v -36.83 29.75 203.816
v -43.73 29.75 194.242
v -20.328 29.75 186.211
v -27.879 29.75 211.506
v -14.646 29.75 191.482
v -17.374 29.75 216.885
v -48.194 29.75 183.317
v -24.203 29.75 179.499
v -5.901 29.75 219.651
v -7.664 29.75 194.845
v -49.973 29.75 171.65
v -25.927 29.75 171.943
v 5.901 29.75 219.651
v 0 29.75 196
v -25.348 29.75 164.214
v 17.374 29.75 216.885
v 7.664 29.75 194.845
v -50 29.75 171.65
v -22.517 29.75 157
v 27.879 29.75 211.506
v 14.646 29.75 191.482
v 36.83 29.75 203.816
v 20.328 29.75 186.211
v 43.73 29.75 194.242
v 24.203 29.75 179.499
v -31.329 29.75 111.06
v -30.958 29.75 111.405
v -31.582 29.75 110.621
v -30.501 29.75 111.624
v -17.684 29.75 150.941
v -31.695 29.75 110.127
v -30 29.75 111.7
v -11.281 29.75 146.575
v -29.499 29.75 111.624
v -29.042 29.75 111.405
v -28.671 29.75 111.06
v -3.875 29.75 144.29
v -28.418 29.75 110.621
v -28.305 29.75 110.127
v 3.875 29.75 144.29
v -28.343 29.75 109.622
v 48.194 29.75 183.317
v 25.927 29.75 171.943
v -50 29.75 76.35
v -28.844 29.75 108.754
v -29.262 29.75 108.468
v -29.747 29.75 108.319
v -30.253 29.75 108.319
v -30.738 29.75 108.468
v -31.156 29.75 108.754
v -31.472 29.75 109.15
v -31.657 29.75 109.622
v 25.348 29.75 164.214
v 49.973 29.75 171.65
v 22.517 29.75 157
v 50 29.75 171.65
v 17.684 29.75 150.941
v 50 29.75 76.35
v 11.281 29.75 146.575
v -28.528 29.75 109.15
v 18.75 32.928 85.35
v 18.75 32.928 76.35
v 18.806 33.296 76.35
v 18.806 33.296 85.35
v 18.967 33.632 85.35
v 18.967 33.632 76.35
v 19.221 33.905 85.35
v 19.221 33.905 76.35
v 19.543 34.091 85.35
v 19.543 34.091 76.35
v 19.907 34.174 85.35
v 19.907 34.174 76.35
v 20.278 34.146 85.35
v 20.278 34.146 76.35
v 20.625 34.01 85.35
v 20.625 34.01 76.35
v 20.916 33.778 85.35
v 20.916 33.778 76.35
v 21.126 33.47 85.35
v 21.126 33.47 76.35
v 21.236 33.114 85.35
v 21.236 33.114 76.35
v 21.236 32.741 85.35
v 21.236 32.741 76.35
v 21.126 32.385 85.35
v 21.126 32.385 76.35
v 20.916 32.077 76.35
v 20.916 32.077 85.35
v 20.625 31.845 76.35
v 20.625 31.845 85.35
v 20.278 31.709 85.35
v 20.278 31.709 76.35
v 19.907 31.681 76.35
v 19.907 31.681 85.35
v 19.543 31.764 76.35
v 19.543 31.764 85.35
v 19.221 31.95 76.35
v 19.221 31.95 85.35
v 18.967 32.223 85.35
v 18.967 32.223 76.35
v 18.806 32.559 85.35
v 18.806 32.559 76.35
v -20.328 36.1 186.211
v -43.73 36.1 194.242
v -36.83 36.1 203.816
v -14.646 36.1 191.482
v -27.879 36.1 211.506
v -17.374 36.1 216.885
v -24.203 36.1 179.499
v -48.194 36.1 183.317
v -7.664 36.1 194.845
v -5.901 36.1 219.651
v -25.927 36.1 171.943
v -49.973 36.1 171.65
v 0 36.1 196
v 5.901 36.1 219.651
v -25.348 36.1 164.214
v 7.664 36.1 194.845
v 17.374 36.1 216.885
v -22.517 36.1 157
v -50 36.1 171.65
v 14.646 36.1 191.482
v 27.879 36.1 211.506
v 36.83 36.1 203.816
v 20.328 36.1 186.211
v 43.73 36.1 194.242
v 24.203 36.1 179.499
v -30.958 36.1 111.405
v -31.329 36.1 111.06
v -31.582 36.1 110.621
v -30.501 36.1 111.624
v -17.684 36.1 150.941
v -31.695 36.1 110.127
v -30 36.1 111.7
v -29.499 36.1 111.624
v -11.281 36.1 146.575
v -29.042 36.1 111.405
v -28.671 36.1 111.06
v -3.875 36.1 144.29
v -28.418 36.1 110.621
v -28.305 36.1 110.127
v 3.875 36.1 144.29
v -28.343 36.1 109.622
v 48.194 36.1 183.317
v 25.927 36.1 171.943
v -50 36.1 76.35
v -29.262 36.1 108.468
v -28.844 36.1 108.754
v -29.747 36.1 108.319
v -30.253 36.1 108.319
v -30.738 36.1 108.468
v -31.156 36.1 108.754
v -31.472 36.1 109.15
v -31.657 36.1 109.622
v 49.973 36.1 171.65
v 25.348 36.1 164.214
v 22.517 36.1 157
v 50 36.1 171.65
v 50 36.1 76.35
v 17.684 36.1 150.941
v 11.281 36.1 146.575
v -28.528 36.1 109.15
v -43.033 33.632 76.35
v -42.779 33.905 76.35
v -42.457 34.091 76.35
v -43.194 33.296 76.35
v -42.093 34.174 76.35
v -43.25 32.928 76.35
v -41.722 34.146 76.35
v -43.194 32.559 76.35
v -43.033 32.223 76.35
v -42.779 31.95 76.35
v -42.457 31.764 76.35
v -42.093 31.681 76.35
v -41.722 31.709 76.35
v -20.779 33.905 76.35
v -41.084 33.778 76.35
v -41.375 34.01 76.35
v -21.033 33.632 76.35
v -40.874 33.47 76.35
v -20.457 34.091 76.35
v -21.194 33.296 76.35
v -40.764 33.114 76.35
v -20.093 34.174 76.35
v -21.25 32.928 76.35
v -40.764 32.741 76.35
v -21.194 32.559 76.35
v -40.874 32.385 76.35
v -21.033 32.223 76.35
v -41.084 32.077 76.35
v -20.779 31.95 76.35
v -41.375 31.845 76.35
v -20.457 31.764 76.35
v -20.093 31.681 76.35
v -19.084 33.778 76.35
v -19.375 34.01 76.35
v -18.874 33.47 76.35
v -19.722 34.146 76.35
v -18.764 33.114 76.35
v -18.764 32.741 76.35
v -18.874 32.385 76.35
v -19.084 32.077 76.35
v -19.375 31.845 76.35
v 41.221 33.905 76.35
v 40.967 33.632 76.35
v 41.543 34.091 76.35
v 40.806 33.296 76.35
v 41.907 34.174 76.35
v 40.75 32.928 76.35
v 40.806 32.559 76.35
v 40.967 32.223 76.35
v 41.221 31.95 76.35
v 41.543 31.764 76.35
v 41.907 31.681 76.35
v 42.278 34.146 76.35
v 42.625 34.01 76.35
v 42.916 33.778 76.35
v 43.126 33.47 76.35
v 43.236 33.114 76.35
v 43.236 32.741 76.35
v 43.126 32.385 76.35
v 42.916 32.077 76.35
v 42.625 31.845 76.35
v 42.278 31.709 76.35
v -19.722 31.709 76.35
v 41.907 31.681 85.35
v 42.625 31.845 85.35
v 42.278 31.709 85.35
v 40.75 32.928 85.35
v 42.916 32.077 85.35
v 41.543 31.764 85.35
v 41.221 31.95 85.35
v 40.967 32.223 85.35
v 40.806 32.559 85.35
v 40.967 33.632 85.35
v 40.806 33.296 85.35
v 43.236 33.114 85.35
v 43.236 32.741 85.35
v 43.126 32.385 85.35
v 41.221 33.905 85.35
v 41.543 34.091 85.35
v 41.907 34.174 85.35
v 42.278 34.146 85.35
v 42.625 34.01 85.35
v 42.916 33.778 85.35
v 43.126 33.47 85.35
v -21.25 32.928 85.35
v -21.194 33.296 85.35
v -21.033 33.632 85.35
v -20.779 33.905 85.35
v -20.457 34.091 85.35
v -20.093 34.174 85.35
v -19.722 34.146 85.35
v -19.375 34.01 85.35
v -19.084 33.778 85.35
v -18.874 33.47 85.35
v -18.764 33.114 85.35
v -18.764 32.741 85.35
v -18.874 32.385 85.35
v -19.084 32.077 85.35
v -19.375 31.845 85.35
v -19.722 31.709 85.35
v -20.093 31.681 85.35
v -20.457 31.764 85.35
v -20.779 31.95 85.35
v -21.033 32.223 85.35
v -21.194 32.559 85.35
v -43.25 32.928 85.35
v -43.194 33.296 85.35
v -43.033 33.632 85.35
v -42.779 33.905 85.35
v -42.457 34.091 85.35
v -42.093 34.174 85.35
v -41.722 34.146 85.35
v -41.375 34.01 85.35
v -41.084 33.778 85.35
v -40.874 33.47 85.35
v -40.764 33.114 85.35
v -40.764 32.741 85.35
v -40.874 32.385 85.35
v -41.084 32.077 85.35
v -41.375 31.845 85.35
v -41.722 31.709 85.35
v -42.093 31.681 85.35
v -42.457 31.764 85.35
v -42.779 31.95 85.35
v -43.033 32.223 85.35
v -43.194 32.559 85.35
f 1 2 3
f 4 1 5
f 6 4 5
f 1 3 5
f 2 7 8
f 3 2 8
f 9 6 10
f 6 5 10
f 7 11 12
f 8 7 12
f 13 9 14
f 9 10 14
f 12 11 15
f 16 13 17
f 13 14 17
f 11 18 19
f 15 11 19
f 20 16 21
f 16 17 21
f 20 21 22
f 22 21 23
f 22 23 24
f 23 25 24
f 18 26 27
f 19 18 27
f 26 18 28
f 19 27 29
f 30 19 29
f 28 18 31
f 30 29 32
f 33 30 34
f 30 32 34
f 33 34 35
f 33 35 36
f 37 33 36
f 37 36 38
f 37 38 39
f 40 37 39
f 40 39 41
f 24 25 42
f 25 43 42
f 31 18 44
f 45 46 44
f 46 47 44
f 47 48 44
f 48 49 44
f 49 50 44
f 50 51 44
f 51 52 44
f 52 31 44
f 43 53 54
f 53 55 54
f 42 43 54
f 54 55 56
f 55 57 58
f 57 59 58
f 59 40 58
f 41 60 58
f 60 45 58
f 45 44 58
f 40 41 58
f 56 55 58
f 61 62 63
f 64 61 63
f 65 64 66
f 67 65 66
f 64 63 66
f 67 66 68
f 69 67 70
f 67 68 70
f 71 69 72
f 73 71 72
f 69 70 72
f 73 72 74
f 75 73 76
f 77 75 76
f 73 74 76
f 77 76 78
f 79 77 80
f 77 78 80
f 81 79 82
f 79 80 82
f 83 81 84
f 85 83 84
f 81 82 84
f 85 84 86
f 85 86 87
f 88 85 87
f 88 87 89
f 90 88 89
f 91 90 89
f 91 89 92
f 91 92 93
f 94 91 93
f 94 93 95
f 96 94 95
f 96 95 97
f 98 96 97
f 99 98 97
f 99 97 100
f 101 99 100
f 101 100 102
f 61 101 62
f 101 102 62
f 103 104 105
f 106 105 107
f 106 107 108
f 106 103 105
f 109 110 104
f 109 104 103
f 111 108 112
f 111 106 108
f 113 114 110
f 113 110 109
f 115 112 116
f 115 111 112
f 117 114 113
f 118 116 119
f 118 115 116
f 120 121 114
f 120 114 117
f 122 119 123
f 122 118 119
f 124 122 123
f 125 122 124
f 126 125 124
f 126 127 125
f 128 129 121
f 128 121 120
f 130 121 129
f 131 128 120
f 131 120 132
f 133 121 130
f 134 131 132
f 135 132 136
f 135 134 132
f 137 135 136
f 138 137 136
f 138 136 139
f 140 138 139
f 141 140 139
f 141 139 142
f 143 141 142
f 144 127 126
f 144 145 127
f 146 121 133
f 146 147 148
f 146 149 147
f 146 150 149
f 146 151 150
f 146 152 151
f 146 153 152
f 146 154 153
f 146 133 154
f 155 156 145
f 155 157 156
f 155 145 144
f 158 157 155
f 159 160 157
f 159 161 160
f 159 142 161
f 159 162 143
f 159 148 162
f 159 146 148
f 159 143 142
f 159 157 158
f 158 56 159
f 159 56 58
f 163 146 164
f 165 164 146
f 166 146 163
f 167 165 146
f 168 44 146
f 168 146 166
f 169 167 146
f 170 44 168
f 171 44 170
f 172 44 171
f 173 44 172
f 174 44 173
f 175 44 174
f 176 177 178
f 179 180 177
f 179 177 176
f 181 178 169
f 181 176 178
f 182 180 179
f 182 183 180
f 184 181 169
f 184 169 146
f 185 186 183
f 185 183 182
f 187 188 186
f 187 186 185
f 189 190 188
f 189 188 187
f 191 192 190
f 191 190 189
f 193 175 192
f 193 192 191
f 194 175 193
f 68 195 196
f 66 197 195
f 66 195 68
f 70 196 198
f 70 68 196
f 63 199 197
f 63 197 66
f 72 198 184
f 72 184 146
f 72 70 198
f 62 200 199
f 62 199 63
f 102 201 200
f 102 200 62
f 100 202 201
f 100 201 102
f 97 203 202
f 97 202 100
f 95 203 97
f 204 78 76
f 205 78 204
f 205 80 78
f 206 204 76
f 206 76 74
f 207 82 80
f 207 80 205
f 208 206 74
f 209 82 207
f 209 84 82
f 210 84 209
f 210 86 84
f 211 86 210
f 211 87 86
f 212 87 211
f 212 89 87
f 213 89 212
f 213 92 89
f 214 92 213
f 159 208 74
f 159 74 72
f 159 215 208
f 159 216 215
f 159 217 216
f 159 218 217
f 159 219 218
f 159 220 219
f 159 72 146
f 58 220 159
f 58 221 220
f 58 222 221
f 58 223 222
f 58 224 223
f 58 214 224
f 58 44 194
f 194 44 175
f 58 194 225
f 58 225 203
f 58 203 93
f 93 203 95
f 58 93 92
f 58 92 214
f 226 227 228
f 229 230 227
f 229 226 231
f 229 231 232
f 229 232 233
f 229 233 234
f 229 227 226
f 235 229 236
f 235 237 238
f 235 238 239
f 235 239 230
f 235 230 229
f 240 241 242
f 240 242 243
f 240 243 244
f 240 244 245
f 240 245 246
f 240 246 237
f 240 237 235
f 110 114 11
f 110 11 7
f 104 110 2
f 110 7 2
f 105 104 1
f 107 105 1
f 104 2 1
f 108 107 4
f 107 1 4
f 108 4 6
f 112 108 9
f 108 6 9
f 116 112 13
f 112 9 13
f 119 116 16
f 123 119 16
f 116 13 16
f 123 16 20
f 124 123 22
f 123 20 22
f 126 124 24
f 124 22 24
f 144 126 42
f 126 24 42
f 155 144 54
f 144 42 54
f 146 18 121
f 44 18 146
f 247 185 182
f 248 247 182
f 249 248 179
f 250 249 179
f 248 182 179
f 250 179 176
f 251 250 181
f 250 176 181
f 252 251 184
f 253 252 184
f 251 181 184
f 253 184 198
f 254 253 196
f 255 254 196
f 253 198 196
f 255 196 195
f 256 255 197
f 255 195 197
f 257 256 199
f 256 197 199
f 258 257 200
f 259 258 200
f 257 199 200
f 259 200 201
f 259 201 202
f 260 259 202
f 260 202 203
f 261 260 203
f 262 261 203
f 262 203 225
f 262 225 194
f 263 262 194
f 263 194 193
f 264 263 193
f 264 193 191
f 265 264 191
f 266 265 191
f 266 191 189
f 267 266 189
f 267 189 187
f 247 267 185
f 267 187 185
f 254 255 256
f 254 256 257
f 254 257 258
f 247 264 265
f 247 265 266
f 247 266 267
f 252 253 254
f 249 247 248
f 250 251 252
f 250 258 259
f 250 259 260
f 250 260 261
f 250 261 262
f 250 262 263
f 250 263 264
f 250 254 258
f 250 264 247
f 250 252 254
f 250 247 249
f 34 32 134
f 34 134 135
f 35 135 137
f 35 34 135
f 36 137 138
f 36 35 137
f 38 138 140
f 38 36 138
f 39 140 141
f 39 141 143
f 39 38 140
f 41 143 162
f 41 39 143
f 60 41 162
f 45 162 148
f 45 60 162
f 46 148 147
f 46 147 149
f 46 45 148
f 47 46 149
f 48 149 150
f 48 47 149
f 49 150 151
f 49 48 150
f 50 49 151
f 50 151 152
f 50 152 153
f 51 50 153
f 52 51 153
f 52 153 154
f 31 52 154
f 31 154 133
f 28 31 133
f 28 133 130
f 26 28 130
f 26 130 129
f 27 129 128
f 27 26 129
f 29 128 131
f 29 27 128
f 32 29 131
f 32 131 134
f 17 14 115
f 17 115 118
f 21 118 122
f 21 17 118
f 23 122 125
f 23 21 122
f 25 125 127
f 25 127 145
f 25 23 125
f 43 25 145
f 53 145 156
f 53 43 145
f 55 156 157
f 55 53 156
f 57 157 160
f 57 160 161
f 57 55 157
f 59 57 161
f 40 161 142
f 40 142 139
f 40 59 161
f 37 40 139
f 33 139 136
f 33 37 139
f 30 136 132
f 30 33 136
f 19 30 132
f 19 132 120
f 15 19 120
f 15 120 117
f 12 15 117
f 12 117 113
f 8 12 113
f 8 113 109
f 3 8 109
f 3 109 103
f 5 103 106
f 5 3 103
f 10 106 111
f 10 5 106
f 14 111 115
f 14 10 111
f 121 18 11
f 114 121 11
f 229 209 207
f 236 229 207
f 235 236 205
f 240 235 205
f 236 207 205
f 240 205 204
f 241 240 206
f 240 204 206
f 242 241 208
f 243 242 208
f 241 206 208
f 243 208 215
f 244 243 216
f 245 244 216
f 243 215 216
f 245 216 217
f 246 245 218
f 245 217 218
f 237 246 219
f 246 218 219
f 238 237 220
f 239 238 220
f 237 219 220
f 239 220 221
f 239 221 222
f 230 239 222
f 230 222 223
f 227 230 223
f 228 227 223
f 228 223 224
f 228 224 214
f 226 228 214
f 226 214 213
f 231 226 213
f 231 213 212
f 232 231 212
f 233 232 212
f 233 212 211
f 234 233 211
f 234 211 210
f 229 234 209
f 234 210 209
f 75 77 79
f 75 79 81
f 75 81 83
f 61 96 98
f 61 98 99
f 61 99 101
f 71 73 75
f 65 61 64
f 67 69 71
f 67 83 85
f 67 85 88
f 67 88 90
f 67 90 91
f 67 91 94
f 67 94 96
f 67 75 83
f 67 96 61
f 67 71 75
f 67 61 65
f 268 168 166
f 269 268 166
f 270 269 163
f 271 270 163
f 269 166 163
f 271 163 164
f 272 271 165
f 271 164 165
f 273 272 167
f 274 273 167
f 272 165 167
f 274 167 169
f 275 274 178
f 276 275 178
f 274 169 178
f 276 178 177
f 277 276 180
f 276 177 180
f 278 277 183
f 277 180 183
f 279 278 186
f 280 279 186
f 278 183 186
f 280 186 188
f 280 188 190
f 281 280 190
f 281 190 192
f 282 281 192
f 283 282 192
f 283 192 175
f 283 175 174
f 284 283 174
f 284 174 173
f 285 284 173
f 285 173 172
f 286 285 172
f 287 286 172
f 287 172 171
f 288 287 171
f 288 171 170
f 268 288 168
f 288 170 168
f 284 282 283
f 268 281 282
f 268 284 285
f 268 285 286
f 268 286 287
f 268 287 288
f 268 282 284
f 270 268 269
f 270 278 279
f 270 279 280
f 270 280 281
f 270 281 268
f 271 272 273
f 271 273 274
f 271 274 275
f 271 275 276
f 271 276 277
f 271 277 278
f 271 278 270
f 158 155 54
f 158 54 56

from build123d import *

# Parameters (mm, degrees)
PARED_START                = 29.75
SK_PARED_W                 = 100
SK_PARED_H                 = 95.3
PARED_DEPTH                = 6.35
CABEZA_START               = 29.75
SK_CABEZA_R                = 50
CABEZA_DEPTH               = 6.35
PASO_CUBO_J2_START         = 29.75
SK_PASO_CUBO_J2_R          = 26
PASO_CUBO_J2_DEPTH         = 6.35
PASANTE_M3_CINCHO_START    = 29.75
SK_PASANTE_M3_CINCHO_R     = 1.7
PASANTE_M3_CINCHO_DEPTH    = 6.35
SK_ROSCA_M3_DESDE_ABAJO_R  = 1.25
ROSCA_M3_DESDE_ABAJO_DEPTH = 9


with BuildPart() as part:
    # Sk_Pared → Pared (new body)
    with BuildSketch(Plane(origin=(0, 0, 0), x_dir=(1, 0, 0), z_dir=(0, 1, 0)).offset(PARED_START)):
        with Locations((0, -124)):
            Rectangle(SK_PARED_W, SK_PARED_H)
    extrude(amount=PARED_DEPTH)

    # Sk_Cabeza → Cabeza (add)
    with BuildSketch(Plane(origin=(0, 0, 0), x_dir=(1, 0, 0), z_dir=(0, 1, 0)).offset(CABEZA_START)):
        with Locations((0, -170)):
            Circle(SK_CABEZA_R)
    extrude(amount=CABEZA_DEPTH)

    # Sk_Paso_cubo_J2 → Paso_cubo_J2 (cut)
    with BuildSketch(Plane(origin=(0, 0, 0), x_dir=(1, 0, 0), z_dir=(0, 1, 0)).offset(PASO_CUBO_J2_START)):
        with Locations(Location((0, -170, 0), (0, 0, 270))):
            Circle(SK_PASO_CUBO_J2_R)
    extrude(amount=PASO_CUBO_J2_DEPTH, mode=Mode.SUBTRACT)

    # Sk_Pasante_M3_cincho → Pasante_M3_cincho (cut)
    with BuildSketch(Plane(origin=(0, 0, 0), x_dir=(1, 0, 0), z_dir=(0, 1, 0)).offset(PASANTE_M3_CINCHO_START)):
        with Locations(Location((-30, -110, 0), (0, 0, 270))):
            Circle(SK_PASANTE_M3_CINCHO_R)
    extrude(amount=PASANTE_M3_CINCHO_DEPTH, mode=Mode.SUBTRACT)

    # Sk_Rosca_M3_desde_abajo → Rosca_M3_desde_abajo (cut)
    with BuildSketch(Plane(origin=(0, 0, 76.35), x_dir=(-1, 0, 0), z_dir=(0, 0, -1))):
        with Locations((42, 32.9275)):
            Circle(SK_ROSCA_M3_DESDE_ABAJO_R)
        with Locations((20, 32.9275)):
            Circle(SK_ROSCA_M3_DESDE_ABAJO_R)
        with Locations((-20, 32.9275)):
            Circle(SK_ROSCA_M3_DESDE_ABAJO_R)
        with Locations((-42, 32.9275)):
            Circle(SK_ROSCA_M3_DESDE_ABAJO_R)
    extrude(amount=-ROSCA_M3_DESDE_ABAJO_DEPTH, mode=Mode.SUBTRACT)


solid = part.part
